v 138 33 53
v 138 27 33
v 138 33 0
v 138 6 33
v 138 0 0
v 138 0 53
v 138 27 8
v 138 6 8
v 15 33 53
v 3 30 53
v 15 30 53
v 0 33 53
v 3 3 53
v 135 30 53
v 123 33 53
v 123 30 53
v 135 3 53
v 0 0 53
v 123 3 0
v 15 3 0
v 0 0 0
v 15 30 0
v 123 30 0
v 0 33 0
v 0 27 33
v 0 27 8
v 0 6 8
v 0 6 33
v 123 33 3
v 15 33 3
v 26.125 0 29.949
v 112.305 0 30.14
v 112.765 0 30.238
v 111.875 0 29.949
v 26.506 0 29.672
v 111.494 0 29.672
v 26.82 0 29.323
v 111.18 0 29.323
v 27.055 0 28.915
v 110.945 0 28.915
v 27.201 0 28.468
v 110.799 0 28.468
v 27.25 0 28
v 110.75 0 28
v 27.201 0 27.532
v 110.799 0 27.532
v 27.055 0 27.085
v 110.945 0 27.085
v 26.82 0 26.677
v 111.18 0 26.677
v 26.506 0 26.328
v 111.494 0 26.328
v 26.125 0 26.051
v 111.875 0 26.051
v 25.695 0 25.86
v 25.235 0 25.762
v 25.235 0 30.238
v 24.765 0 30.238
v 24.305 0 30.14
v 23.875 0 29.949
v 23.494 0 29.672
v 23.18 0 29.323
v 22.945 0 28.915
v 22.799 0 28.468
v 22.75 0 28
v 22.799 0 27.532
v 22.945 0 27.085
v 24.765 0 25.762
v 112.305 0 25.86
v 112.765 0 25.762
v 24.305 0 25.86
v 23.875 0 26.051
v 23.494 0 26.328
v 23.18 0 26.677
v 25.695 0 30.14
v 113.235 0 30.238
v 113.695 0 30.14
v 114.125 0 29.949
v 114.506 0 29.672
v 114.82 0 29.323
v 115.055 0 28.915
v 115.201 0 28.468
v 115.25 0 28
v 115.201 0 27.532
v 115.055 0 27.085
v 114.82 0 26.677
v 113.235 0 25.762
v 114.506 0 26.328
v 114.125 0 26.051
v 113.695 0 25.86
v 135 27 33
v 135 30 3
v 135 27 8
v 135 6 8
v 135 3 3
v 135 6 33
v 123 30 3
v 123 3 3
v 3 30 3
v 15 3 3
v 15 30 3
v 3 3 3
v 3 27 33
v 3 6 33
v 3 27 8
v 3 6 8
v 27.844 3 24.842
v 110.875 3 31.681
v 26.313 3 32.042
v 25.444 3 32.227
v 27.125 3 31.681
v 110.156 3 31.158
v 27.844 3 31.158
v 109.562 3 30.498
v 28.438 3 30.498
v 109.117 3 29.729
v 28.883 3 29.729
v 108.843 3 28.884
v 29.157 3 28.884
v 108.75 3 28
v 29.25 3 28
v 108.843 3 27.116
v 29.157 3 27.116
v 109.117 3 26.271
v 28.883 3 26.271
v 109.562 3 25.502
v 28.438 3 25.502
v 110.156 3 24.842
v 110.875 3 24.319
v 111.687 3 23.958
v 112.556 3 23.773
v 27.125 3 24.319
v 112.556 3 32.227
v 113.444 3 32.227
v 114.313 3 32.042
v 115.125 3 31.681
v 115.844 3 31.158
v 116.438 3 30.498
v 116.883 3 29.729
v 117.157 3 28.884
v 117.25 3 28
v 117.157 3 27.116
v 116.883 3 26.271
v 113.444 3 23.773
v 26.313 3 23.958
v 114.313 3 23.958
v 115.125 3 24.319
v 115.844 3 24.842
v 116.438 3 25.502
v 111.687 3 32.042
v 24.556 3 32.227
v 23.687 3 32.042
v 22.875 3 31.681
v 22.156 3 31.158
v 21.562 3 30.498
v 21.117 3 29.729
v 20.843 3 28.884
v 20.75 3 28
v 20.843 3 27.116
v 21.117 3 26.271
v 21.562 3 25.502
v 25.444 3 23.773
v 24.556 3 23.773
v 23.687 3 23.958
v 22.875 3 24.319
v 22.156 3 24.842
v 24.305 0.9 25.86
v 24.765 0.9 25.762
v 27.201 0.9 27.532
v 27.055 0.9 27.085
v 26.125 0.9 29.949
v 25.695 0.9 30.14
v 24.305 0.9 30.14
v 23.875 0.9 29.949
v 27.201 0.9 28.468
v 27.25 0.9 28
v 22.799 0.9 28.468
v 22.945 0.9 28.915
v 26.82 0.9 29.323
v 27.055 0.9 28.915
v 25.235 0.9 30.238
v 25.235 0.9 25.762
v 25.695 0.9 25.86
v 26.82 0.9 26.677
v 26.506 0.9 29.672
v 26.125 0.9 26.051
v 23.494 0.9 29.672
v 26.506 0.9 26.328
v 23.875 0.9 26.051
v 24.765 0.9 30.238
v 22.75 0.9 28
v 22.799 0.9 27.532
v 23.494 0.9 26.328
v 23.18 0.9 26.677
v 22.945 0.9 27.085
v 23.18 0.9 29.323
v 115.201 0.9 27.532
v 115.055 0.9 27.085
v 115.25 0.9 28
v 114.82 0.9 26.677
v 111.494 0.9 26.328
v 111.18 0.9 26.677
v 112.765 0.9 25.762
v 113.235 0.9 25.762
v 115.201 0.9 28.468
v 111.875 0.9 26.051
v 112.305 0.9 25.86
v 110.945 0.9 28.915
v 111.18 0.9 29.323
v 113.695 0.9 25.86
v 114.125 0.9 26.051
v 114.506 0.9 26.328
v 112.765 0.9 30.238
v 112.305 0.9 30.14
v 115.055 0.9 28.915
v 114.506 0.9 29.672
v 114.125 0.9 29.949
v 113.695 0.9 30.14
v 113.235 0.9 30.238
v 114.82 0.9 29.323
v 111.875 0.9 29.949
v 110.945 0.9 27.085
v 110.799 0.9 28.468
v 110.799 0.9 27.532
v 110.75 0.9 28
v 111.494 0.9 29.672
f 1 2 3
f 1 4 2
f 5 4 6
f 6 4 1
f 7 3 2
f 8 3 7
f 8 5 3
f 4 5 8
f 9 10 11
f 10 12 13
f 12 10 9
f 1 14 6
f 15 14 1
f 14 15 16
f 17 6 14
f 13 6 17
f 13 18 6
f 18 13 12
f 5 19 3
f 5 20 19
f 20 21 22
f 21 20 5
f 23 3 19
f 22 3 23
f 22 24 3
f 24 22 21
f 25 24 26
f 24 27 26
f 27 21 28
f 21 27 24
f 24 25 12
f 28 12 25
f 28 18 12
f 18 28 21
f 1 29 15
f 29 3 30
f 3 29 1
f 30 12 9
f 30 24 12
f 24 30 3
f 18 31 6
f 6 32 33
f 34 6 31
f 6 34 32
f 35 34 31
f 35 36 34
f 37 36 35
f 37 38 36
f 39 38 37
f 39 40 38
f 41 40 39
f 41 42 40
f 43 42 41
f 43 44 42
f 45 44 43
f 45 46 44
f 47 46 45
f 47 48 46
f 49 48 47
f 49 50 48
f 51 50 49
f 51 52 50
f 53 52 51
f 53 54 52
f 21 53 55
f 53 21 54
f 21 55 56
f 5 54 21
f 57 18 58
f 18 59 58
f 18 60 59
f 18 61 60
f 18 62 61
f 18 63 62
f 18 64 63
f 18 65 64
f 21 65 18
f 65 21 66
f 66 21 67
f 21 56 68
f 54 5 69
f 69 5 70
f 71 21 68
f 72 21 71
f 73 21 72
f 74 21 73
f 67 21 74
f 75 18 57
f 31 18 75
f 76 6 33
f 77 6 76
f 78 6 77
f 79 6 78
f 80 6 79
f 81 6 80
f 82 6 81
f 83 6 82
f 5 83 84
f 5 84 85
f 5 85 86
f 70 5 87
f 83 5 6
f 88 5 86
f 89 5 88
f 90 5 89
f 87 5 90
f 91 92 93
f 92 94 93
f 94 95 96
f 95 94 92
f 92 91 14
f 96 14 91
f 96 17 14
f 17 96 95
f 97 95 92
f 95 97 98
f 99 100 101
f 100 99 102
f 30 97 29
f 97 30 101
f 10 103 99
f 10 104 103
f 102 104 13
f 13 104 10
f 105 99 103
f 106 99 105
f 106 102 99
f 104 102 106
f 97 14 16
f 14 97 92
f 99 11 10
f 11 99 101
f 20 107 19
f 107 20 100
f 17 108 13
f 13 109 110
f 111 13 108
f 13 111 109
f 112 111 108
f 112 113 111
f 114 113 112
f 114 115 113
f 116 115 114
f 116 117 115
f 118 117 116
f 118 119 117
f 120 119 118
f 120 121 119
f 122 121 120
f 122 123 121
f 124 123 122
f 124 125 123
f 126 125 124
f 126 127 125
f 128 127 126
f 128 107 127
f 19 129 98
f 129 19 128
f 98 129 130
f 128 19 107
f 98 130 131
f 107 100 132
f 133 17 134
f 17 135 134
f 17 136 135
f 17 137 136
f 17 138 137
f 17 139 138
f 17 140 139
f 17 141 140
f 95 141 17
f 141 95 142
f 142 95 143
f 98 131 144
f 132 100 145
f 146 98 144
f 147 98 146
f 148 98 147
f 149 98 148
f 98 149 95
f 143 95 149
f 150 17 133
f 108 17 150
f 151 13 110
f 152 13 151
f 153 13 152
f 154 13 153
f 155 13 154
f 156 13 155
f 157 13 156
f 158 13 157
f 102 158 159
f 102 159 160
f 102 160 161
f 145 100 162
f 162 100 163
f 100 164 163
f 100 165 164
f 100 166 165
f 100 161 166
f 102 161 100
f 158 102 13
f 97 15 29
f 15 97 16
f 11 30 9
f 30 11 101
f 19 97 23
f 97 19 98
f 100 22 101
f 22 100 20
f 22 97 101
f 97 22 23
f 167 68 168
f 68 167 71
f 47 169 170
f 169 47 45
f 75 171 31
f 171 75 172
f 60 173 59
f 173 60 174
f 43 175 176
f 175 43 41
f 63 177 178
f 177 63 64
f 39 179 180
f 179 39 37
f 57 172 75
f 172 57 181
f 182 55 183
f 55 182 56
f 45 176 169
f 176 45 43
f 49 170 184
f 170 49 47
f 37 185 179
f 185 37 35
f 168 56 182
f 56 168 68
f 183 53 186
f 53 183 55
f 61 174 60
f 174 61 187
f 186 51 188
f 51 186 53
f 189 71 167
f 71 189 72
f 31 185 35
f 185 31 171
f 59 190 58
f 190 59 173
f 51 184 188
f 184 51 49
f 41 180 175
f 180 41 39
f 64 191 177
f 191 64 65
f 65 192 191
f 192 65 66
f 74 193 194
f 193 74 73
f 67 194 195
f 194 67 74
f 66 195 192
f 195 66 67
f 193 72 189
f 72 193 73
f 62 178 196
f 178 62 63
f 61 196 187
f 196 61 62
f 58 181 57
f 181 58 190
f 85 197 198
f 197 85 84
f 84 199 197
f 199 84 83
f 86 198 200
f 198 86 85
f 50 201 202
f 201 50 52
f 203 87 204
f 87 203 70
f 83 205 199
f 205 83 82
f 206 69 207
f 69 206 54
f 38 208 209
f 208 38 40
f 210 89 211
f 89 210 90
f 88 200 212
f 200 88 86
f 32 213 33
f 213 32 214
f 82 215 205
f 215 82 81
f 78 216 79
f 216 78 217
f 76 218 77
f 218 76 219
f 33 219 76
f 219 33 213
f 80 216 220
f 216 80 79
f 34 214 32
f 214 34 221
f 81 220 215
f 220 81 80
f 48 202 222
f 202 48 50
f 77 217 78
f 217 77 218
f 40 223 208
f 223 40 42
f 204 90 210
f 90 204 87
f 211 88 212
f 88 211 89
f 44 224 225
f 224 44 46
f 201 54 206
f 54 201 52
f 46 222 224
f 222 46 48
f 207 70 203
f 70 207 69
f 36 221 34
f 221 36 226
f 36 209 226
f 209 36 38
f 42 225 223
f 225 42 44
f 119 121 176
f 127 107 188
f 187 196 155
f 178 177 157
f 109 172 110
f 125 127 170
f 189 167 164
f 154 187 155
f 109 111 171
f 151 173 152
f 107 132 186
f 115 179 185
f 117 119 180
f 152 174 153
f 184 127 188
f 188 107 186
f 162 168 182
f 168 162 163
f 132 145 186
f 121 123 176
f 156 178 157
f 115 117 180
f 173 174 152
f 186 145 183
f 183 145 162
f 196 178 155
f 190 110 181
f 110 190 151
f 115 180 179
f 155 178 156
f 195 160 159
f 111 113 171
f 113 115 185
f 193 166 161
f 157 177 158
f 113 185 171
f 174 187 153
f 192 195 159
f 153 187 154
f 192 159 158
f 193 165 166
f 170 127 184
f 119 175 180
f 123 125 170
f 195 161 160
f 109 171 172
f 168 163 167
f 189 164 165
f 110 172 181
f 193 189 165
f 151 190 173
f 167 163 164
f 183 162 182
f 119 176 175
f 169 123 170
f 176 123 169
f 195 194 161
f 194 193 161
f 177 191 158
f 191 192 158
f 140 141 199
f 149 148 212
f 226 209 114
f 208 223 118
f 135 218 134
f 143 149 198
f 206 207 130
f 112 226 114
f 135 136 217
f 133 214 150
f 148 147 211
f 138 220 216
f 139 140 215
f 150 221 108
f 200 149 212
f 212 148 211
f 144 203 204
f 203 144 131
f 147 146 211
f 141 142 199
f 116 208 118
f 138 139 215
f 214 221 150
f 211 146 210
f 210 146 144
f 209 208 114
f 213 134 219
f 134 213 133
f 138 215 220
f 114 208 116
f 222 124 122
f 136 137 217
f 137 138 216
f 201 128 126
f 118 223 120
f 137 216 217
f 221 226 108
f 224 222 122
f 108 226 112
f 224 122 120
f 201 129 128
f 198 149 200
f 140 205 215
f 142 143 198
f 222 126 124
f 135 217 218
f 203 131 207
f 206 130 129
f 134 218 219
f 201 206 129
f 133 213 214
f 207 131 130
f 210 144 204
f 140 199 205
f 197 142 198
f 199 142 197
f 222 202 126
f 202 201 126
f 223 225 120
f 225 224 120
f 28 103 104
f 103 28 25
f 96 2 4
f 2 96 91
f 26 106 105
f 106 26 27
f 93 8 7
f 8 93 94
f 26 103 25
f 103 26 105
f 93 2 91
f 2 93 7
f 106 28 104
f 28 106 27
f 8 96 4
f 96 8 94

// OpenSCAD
// Support mural pour Switch Réseau D-Link GO-SW-8G (130 x 90 x 25 mm)
// Conçu pour s'imprimer SANS supports (imprimer à plat sur le dos)

// --- Paramètres ajustables ---
largeur_switch = 130;
profondeur_switch = 25;
marge = 2; // Marge pour que le switch glisse facilement

// Dimensions internes calculées
int_w = largeur_switch + marge; 
int_d = profondeur_switch + marge;
int_h = 50; // Hauteur de maintien 

ep = 3; // Épaisseur des parois (3mm pour la solidité)

module support() {
    difference() {
        // 1. Bloc extérieur complet
        cube([int_w + 2*ep, int_d + 2*ep, int_h + ep]);
        
        // 2. Évidement central (l'endroit où on glisse le switch)
        translate([ep, ep, ep])
            cube([int_w, int_d, int_h + 1]);
            
        // 3. Grande ouverture à l'avant (économie de plastique et aération)
        translate([ep + 12, int_d + ep - 1, ep])
            cube([int_w - 24, ep + 2, int_h + 1]);
            
        // 4. Ouverture en bas (pour les câbles réseau si orientés vers le bas)
        translate([ep + 12, ep, -1])
            cube([int_w - 24, int_d, ep + 2]);
            
        // 5. Trous de fixation murale (au dos)
        translate([25, -1, int_h/2 + ep])
            rotate([-90, 0, 0])
            cylinder(d=4.5, h=ep+2, $fn=30);
            
        translate([int_w + 2*ep - 25, -1, int_h/2 + ep])
            rotate([-90, 0, 0])
            cylinder(d=4.5, h=ep+2, $fn=30);
            
        // 6. Fraisures pour cacher les têtes de vis (diamètre 8.5mm)
        translate([25, ep, int_h/2 + ep])
            rotate([90, 0, 0])
            cylinder(d1=8.5, d2=4.5, h=2.1, $fn=30); 
            
        translate([int_w + 2*ep - 25, ep, int_h/2 + ep])
            rotate([90, 0, 0])
            cylinder(d1=8.5, d2=4.5, h=2.1, $fn=30);
            
        // 7. Trous latéraux pour le connecteur d'alimentation
        // Démarre à 5mm du fond et s'arrête à 20mm du bord supérieur 
        // pour conserver une ceinture très rigide en haut de la pièce.
        translate([-1, ep + 3, ep + 5])
            cube([int_w + 2*ep + 2, int_d - 6, 25]);
    }
}

support();
